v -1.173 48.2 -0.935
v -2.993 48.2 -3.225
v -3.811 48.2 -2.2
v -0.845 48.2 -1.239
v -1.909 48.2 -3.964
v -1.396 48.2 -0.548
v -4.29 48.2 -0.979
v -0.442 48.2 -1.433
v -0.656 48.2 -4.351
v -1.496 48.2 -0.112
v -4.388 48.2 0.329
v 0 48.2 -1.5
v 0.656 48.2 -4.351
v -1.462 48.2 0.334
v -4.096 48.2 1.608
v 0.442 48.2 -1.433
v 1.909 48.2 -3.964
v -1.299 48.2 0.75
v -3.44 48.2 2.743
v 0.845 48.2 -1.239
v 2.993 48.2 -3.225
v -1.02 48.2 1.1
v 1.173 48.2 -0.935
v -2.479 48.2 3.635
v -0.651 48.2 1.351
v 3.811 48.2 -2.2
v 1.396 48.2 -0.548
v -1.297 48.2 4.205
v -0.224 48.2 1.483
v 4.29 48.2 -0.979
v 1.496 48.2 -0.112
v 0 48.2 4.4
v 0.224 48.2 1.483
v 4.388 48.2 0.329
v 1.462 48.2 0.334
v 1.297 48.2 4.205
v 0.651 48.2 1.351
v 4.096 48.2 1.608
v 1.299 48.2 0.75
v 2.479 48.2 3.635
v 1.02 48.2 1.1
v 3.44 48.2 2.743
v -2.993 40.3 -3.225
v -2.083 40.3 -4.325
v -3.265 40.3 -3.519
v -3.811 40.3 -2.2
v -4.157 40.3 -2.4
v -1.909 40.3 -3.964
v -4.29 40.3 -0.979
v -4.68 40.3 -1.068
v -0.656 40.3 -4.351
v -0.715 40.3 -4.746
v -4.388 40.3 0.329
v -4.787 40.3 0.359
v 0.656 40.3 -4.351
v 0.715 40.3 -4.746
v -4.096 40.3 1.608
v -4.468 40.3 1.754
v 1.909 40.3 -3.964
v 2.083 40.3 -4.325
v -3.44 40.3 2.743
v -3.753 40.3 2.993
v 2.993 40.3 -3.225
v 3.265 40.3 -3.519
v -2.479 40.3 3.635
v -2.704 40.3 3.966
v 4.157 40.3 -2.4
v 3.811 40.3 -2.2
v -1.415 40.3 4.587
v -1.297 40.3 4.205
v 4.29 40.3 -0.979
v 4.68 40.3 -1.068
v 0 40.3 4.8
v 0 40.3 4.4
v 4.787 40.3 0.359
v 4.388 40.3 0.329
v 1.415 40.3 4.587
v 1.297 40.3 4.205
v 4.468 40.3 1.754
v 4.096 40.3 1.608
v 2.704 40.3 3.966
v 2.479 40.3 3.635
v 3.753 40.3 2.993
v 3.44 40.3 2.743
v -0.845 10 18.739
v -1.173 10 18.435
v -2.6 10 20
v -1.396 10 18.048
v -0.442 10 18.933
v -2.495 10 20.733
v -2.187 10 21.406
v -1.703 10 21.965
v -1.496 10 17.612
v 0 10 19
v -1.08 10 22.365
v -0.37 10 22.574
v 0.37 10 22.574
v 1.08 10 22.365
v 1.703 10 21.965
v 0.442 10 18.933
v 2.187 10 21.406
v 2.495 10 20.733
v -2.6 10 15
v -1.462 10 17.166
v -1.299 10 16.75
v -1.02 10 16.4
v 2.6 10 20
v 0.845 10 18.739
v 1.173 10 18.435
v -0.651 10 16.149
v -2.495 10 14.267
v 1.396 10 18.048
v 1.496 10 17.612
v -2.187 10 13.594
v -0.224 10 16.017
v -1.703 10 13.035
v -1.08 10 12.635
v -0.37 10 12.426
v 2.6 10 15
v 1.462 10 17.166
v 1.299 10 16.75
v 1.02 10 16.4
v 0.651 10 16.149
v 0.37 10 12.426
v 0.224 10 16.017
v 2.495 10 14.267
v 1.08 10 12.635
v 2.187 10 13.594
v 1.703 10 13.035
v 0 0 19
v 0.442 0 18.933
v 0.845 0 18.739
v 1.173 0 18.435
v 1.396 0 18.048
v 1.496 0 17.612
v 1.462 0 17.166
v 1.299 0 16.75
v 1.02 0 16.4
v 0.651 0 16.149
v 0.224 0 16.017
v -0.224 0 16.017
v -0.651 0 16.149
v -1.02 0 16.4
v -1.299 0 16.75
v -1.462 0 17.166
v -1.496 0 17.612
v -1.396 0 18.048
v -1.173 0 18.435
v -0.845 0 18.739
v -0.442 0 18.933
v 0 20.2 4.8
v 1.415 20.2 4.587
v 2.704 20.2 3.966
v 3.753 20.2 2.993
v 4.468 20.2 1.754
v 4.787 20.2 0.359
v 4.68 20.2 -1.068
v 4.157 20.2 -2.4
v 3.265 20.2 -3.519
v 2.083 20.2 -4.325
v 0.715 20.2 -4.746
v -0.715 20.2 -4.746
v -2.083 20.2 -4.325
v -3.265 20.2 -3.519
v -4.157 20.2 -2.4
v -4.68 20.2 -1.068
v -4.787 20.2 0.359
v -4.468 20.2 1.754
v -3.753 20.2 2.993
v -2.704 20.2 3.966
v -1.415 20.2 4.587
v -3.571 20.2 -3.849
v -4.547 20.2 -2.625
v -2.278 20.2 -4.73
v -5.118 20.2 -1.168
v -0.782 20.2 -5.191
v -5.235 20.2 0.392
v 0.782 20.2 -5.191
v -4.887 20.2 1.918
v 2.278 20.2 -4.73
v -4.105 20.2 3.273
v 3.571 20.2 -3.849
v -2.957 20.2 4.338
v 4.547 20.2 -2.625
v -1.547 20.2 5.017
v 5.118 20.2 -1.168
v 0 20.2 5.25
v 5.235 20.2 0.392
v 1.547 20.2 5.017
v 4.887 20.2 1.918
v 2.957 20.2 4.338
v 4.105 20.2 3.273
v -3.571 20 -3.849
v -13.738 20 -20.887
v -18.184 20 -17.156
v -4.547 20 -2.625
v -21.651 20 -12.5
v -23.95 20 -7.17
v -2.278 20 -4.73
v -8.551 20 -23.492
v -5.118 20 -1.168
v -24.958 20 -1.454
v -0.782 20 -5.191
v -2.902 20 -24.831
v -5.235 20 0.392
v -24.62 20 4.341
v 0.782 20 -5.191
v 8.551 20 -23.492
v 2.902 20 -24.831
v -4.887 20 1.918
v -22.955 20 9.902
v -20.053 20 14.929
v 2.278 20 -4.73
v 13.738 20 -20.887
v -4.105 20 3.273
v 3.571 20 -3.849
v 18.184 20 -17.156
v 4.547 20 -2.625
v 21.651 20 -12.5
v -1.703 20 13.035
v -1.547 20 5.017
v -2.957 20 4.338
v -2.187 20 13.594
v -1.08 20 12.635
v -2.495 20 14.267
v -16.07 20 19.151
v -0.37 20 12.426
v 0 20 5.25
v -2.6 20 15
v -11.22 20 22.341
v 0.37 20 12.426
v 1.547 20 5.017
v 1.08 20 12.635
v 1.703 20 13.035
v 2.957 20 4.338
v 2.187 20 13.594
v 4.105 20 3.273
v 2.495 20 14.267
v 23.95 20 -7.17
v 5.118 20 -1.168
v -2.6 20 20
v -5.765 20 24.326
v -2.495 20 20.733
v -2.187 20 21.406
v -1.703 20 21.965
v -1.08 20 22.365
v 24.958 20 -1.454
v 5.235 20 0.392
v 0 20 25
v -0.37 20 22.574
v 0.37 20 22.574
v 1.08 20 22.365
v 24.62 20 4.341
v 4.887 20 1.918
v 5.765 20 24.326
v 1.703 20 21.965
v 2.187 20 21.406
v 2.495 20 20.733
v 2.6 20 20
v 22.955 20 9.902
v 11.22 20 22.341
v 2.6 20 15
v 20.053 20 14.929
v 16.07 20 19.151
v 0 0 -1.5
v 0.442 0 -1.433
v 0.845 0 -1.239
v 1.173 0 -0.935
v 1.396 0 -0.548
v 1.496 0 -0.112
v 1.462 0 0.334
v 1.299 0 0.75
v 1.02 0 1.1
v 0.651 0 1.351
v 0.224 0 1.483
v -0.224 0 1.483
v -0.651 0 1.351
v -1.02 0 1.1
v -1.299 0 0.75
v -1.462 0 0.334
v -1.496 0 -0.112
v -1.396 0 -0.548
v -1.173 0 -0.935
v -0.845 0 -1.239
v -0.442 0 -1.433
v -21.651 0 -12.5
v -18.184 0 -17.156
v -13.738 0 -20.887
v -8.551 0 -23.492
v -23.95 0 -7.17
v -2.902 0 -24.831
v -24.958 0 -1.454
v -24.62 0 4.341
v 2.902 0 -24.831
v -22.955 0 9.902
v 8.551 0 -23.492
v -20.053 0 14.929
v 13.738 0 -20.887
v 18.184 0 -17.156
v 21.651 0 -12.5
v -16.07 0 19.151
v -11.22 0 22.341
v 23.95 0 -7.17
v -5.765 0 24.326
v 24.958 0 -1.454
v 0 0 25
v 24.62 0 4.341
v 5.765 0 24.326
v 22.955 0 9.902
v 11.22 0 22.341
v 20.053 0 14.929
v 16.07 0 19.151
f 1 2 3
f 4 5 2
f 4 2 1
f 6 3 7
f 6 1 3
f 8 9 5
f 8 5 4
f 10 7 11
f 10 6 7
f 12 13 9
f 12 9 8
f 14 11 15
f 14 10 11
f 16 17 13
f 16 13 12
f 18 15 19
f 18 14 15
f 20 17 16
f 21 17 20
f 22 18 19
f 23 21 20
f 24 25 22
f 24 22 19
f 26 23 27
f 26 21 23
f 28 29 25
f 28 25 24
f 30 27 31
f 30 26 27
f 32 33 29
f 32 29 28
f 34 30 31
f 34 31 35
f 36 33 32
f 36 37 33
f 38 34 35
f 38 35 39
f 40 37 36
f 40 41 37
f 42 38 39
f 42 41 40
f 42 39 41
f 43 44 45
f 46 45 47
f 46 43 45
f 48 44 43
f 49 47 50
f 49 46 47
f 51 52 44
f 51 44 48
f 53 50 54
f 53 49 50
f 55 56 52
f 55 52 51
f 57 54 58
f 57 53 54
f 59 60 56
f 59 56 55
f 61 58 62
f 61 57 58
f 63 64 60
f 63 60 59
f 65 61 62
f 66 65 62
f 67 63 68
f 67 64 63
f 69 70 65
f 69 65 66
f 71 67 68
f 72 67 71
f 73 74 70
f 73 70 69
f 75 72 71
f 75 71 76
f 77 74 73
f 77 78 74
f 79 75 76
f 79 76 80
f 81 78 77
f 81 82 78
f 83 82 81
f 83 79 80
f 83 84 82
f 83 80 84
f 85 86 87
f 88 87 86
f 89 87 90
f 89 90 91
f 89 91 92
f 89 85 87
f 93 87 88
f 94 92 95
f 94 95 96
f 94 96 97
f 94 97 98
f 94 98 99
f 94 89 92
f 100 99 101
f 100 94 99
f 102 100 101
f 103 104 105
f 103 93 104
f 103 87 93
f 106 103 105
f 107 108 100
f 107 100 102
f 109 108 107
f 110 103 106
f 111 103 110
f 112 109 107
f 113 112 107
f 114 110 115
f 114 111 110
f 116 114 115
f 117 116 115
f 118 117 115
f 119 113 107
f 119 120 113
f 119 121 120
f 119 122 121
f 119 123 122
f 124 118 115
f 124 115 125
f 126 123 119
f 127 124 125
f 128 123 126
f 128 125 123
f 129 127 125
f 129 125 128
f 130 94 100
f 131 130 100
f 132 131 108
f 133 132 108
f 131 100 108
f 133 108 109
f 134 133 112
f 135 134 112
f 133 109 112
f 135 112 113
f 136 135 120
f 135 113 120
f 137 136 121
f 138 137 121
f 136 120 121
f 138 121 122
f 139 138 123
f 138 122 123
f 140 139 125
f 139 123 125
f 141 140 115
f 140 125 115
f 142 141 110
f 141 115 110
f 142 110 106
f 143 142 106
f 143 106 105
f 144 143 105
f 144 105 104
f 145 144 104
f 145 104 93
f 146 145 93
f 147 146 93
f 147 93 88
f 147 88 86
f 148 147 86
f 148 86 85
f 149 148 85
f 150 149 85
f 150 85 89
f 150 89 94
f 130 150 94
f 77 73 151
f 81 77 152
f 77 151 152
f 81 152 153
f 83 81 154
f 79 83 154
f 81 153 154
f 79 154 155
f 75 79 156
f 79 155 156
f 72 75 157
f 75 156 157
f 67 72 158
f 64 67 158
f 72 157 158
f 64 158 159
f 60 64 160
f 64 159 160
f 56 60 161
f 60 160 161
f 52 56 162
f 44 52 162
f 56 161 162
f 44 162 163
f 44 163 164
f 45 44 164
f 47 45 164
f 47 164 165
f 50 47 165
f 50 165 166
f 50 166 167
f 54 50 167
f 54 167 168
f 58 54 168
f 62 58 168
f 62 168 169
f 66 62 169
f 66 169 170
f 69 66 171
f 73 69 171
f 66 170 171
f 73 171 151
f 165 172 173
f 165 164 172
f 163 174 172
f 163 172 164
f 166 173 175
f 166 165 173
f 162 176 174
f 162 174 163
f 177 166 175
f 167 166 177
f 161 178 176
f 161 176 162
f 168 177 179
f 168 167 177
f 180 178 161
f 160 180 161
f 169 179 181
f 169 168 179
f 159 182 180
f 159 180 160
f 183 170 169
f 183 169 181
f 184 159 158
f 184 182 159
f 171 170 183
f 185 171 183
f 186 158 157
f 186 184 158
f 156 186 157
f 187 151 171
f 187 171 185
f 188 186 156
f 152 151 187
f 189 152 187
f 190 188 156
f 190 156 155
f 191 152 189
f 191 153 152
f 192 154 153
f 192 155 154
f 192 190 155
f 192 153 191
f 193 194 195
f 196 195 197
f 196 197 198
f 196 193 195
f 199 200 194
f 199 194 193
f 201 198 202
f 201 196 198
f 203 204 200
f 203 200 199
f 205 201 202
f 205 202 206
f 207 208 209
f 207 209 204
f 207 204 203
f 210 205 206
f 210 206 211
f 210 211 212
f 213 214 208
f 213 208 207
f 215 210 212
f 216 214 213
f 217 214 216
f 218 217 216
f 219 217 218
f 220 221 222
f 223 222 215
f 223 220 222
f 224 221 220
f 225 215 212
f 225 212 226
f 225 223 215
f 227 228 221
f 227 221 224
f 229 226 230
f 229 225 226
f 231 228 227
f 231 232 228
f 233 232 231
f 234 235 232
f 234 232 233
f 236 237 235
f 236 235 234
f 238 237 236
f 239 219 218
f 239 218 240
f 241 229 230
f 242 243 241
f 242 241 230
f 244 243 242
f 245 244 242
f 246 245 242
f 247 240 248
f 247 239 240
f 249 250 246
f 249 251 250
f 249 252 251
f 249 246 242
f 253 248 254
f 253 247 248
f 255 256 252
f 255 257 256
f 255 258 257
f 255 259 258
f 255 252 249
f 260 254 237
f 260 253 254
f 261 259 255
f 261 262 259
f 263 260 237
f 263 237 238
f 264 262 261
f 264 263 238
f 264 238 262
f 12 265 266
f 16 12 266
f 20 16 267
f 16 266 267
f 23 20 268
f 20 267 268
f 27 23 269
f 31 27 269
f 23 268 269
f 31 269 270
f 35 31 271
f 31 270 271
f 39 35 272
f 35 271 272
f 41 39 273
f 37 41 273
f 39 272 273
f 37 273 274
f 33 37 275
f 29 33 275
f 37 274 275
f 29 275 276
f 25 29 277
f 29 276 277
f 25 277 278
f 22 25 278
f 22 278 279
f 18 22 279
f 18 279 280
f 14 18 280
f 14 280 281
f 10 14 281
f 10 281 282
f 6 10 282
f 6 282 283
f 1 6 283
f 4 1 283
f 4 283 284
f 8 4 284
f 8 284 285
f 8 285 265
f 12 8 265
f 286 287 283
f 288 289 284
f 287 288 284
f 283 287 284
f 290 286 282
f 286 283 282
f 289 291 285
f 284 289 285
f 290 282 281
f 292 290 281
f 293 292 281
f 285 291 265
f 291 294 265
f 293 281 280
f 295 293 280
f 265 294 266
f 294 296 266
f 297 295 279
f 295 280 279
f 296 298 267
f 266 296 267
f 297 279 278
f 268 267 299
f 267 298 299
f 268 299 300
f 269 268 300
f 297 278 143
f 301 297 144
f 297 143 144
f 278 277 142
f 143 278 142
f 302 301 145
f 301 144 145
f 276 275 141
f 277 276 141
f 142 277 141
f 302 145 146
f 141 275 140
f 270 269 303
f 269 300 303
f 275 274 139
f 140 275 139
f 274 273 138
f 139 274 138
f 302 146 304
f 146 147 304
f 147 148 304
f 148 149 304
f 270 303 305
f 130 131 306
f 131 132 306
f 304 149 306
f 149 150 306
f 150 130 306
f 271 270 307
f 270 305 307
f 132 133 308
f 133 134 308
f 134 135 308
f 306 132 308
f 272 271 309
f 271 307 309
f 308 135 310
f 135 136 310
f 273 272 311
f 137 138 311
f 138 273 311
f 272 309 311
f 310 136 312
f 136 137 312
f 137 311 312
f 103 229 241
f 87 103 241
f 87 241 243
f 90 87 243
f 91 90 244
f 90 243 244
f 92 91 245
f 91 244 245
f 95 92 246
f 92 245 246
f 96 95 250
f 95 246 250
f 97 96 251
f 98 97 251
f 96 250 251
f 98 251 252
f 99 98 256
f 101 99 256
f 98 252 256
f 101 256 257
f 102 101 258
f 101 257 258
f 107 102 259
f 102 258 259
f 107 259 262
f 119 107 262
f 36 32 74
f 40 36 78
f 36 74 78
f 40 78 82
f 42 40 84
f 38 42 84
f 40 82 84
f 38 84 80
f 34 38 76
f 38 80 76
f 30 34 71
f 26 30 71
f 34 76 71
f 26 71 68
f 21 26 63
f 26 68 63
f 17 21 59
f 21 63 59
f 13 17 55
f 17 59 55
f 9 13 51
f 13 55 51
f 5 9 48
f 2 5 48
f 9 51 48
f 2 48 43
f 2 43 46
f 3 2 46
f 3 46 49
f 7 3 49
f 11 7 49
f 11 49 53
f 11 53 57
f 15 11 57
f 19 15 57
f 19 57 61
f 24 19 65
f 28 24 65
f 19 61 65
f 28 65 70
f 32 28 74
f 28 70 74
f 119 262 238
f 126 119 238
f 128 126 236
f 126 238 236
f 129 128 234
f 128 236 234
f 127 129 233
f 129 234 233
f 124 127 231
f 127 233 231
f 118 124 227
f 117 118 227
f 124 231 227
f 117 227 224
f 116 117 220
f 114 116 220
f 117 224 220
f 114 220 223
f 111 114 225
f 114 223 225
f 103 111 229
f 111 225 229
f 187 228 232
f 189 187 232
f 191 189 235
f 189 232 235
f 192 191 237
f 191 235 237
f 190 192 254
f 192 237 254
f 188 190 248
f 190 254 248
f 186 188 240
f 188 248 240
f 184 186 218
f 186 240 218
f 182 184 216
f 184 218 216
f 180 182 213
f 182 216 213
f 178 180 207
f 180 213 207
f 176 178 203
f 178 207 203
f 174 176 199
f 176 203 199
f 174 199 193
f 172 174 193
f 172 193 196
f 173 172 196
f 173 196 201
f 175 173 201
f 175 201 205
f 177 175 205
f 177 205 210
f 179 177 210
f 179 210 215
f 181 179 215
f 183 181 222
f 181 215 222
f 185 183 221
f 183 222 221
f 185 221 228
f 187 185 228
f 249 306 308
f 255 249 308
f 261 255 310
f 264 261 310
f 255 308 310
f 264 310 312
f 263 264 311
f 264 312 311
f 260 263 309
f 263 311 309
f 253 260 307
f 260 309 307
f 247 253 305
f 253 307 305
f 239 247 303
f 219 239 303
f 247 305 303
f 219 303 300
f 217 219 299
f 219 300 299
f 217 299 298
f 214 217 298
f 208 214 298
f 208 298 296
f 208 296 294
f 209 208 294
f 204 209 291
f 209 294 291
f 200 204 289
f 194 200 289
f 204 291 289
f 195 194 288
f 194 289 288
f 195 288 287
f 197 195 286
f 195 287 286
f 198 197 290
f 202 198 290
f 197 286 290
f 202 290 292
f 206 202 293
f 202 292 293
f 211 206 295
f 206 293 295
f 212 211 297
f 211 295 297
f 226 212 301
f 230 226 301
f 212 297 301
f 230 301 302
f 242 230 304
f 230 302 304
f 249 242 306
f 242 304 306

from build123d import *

# Parameters (mm, degrees)
SKETCH1_R           = 25
BOSS_EXTRUDE1_DEPTH = 20
CUT_EXTRUDE2_DEPTH  = 10
SKETCH5_R           = 1.5
CUT_EXTRUDE3_DEPTH  = 37.742346142
SKETCH2_R           = 5.25
BOSS_EXTRUDE2_DEPTH = 0.2
SKETCH7_R           = 4.8
BOSS_EXTRUDE3_DEPTH = 20.1
SKETCH8_R           = 4.4
BOSS_EXTRUDE4_DEPTH = 7.9
SKETCH6_R           = 1.5
CUT_EXTRUDE4_DEPTH  = 60.776584044


with BuildPart() as part:
    # Sketch1 → Boss-Extrude1 (new body)
    with BuildSketch(Plane(origin=(0, 0, 0), x_dir=(1, 0, 0), z_dir=(0, 1, 0))):
        with Locations(Location((0, 0, 0), (0, 0, 270))):
            Circle(SKETCH1_R)
    extrude(amount=BOSS_EXTRUDE1_DEPTH)

    # Sketch3 → Cut-Extrude2 (cut)
    with BuildSketch(Plane(origin=(0, 20, 0), x_dir=(1, 0, 0), z_dir=(0, 1, 0))):
        with BuildLine():
            Line((-2.6, -15), (-2.6, -20))
            ThreePointArc((-2.6, -20), (0, -22.6), (2.6, -20))
            Line((2.6, -20), (2.6, -15))
            ThreePointArc((2.6, -15), (0, -12.4), (-2.6, -15))
        make_face()
    extrude(amount=-CUT_EXTRUDE2_DEPTH, mode=Mode.SUBTRACT)

    # Sketch5 → Cut-Extrude3 (cut, through all)
    with BuildSketch(Plane(origin=(0, 10, 0), x_dir=(1, 0, 0), z_dir=(0, 1, 0))):
        with Locations(Location((0, -17.5, 0), (0, 0, 270))):
            Circle(SKETCH5_R)
    extrude(amount=-CUT_EXTRUDE3_DEPTH, mode=Mode.SUBTRACT)

    # Sketch2 → Boss-Extrude2 (add)
    with BuildSketch(Plane(origin=(0, 20, 0), x_dir=(1, 0, 0), z_dir=(0, 1, 0))):
        with Locations(Location((0, 0, 0), (0, 0, 270))):
            Circle(SKETCH2_R)
    extrude(amount=BOSS_EXTRUDE2_DEPTH)

    # Sketch7 → Boss-Extrude3 (add)
    with BuildSketch(Plane(origin=(0, 20.2, 0), x_dir=(1, 0, 0), z_dir=(0, 1, 0))):
        with Locations(Location((0, 0, 0), (0, 0, 270))):
            Circle(SKETCH7_R)
    extrude(amount=BOSS_EXTRUDE3_DEPTH)

    # Sketch8 → Boss-Extrude4 (add)
    with BuildSketch(Plane(origin=(0, 40.3, 0), x_dir=(1, 0, 0), z_dir=(0, 1, 0))):
        with Locations(Location((0, 0, 0), (0, 0, 270))):
            Circle(SKETCH8_R)
    extrude(amount=BOSS_EXTRUDE4_DEPTH)

    # Sketch6 → Cut-Extrude4 (cut, through all)
    with BuildSketch(Plane.XZ):
        with Locations(Location((0, 0, 0), (0, 0, 270))):
            Circle(SKETCH6_R)
    extrude(amount=-CUT_EXTRUDE4_DEPTH, mode=Mode.SUBTRACT)


solid = part.part
